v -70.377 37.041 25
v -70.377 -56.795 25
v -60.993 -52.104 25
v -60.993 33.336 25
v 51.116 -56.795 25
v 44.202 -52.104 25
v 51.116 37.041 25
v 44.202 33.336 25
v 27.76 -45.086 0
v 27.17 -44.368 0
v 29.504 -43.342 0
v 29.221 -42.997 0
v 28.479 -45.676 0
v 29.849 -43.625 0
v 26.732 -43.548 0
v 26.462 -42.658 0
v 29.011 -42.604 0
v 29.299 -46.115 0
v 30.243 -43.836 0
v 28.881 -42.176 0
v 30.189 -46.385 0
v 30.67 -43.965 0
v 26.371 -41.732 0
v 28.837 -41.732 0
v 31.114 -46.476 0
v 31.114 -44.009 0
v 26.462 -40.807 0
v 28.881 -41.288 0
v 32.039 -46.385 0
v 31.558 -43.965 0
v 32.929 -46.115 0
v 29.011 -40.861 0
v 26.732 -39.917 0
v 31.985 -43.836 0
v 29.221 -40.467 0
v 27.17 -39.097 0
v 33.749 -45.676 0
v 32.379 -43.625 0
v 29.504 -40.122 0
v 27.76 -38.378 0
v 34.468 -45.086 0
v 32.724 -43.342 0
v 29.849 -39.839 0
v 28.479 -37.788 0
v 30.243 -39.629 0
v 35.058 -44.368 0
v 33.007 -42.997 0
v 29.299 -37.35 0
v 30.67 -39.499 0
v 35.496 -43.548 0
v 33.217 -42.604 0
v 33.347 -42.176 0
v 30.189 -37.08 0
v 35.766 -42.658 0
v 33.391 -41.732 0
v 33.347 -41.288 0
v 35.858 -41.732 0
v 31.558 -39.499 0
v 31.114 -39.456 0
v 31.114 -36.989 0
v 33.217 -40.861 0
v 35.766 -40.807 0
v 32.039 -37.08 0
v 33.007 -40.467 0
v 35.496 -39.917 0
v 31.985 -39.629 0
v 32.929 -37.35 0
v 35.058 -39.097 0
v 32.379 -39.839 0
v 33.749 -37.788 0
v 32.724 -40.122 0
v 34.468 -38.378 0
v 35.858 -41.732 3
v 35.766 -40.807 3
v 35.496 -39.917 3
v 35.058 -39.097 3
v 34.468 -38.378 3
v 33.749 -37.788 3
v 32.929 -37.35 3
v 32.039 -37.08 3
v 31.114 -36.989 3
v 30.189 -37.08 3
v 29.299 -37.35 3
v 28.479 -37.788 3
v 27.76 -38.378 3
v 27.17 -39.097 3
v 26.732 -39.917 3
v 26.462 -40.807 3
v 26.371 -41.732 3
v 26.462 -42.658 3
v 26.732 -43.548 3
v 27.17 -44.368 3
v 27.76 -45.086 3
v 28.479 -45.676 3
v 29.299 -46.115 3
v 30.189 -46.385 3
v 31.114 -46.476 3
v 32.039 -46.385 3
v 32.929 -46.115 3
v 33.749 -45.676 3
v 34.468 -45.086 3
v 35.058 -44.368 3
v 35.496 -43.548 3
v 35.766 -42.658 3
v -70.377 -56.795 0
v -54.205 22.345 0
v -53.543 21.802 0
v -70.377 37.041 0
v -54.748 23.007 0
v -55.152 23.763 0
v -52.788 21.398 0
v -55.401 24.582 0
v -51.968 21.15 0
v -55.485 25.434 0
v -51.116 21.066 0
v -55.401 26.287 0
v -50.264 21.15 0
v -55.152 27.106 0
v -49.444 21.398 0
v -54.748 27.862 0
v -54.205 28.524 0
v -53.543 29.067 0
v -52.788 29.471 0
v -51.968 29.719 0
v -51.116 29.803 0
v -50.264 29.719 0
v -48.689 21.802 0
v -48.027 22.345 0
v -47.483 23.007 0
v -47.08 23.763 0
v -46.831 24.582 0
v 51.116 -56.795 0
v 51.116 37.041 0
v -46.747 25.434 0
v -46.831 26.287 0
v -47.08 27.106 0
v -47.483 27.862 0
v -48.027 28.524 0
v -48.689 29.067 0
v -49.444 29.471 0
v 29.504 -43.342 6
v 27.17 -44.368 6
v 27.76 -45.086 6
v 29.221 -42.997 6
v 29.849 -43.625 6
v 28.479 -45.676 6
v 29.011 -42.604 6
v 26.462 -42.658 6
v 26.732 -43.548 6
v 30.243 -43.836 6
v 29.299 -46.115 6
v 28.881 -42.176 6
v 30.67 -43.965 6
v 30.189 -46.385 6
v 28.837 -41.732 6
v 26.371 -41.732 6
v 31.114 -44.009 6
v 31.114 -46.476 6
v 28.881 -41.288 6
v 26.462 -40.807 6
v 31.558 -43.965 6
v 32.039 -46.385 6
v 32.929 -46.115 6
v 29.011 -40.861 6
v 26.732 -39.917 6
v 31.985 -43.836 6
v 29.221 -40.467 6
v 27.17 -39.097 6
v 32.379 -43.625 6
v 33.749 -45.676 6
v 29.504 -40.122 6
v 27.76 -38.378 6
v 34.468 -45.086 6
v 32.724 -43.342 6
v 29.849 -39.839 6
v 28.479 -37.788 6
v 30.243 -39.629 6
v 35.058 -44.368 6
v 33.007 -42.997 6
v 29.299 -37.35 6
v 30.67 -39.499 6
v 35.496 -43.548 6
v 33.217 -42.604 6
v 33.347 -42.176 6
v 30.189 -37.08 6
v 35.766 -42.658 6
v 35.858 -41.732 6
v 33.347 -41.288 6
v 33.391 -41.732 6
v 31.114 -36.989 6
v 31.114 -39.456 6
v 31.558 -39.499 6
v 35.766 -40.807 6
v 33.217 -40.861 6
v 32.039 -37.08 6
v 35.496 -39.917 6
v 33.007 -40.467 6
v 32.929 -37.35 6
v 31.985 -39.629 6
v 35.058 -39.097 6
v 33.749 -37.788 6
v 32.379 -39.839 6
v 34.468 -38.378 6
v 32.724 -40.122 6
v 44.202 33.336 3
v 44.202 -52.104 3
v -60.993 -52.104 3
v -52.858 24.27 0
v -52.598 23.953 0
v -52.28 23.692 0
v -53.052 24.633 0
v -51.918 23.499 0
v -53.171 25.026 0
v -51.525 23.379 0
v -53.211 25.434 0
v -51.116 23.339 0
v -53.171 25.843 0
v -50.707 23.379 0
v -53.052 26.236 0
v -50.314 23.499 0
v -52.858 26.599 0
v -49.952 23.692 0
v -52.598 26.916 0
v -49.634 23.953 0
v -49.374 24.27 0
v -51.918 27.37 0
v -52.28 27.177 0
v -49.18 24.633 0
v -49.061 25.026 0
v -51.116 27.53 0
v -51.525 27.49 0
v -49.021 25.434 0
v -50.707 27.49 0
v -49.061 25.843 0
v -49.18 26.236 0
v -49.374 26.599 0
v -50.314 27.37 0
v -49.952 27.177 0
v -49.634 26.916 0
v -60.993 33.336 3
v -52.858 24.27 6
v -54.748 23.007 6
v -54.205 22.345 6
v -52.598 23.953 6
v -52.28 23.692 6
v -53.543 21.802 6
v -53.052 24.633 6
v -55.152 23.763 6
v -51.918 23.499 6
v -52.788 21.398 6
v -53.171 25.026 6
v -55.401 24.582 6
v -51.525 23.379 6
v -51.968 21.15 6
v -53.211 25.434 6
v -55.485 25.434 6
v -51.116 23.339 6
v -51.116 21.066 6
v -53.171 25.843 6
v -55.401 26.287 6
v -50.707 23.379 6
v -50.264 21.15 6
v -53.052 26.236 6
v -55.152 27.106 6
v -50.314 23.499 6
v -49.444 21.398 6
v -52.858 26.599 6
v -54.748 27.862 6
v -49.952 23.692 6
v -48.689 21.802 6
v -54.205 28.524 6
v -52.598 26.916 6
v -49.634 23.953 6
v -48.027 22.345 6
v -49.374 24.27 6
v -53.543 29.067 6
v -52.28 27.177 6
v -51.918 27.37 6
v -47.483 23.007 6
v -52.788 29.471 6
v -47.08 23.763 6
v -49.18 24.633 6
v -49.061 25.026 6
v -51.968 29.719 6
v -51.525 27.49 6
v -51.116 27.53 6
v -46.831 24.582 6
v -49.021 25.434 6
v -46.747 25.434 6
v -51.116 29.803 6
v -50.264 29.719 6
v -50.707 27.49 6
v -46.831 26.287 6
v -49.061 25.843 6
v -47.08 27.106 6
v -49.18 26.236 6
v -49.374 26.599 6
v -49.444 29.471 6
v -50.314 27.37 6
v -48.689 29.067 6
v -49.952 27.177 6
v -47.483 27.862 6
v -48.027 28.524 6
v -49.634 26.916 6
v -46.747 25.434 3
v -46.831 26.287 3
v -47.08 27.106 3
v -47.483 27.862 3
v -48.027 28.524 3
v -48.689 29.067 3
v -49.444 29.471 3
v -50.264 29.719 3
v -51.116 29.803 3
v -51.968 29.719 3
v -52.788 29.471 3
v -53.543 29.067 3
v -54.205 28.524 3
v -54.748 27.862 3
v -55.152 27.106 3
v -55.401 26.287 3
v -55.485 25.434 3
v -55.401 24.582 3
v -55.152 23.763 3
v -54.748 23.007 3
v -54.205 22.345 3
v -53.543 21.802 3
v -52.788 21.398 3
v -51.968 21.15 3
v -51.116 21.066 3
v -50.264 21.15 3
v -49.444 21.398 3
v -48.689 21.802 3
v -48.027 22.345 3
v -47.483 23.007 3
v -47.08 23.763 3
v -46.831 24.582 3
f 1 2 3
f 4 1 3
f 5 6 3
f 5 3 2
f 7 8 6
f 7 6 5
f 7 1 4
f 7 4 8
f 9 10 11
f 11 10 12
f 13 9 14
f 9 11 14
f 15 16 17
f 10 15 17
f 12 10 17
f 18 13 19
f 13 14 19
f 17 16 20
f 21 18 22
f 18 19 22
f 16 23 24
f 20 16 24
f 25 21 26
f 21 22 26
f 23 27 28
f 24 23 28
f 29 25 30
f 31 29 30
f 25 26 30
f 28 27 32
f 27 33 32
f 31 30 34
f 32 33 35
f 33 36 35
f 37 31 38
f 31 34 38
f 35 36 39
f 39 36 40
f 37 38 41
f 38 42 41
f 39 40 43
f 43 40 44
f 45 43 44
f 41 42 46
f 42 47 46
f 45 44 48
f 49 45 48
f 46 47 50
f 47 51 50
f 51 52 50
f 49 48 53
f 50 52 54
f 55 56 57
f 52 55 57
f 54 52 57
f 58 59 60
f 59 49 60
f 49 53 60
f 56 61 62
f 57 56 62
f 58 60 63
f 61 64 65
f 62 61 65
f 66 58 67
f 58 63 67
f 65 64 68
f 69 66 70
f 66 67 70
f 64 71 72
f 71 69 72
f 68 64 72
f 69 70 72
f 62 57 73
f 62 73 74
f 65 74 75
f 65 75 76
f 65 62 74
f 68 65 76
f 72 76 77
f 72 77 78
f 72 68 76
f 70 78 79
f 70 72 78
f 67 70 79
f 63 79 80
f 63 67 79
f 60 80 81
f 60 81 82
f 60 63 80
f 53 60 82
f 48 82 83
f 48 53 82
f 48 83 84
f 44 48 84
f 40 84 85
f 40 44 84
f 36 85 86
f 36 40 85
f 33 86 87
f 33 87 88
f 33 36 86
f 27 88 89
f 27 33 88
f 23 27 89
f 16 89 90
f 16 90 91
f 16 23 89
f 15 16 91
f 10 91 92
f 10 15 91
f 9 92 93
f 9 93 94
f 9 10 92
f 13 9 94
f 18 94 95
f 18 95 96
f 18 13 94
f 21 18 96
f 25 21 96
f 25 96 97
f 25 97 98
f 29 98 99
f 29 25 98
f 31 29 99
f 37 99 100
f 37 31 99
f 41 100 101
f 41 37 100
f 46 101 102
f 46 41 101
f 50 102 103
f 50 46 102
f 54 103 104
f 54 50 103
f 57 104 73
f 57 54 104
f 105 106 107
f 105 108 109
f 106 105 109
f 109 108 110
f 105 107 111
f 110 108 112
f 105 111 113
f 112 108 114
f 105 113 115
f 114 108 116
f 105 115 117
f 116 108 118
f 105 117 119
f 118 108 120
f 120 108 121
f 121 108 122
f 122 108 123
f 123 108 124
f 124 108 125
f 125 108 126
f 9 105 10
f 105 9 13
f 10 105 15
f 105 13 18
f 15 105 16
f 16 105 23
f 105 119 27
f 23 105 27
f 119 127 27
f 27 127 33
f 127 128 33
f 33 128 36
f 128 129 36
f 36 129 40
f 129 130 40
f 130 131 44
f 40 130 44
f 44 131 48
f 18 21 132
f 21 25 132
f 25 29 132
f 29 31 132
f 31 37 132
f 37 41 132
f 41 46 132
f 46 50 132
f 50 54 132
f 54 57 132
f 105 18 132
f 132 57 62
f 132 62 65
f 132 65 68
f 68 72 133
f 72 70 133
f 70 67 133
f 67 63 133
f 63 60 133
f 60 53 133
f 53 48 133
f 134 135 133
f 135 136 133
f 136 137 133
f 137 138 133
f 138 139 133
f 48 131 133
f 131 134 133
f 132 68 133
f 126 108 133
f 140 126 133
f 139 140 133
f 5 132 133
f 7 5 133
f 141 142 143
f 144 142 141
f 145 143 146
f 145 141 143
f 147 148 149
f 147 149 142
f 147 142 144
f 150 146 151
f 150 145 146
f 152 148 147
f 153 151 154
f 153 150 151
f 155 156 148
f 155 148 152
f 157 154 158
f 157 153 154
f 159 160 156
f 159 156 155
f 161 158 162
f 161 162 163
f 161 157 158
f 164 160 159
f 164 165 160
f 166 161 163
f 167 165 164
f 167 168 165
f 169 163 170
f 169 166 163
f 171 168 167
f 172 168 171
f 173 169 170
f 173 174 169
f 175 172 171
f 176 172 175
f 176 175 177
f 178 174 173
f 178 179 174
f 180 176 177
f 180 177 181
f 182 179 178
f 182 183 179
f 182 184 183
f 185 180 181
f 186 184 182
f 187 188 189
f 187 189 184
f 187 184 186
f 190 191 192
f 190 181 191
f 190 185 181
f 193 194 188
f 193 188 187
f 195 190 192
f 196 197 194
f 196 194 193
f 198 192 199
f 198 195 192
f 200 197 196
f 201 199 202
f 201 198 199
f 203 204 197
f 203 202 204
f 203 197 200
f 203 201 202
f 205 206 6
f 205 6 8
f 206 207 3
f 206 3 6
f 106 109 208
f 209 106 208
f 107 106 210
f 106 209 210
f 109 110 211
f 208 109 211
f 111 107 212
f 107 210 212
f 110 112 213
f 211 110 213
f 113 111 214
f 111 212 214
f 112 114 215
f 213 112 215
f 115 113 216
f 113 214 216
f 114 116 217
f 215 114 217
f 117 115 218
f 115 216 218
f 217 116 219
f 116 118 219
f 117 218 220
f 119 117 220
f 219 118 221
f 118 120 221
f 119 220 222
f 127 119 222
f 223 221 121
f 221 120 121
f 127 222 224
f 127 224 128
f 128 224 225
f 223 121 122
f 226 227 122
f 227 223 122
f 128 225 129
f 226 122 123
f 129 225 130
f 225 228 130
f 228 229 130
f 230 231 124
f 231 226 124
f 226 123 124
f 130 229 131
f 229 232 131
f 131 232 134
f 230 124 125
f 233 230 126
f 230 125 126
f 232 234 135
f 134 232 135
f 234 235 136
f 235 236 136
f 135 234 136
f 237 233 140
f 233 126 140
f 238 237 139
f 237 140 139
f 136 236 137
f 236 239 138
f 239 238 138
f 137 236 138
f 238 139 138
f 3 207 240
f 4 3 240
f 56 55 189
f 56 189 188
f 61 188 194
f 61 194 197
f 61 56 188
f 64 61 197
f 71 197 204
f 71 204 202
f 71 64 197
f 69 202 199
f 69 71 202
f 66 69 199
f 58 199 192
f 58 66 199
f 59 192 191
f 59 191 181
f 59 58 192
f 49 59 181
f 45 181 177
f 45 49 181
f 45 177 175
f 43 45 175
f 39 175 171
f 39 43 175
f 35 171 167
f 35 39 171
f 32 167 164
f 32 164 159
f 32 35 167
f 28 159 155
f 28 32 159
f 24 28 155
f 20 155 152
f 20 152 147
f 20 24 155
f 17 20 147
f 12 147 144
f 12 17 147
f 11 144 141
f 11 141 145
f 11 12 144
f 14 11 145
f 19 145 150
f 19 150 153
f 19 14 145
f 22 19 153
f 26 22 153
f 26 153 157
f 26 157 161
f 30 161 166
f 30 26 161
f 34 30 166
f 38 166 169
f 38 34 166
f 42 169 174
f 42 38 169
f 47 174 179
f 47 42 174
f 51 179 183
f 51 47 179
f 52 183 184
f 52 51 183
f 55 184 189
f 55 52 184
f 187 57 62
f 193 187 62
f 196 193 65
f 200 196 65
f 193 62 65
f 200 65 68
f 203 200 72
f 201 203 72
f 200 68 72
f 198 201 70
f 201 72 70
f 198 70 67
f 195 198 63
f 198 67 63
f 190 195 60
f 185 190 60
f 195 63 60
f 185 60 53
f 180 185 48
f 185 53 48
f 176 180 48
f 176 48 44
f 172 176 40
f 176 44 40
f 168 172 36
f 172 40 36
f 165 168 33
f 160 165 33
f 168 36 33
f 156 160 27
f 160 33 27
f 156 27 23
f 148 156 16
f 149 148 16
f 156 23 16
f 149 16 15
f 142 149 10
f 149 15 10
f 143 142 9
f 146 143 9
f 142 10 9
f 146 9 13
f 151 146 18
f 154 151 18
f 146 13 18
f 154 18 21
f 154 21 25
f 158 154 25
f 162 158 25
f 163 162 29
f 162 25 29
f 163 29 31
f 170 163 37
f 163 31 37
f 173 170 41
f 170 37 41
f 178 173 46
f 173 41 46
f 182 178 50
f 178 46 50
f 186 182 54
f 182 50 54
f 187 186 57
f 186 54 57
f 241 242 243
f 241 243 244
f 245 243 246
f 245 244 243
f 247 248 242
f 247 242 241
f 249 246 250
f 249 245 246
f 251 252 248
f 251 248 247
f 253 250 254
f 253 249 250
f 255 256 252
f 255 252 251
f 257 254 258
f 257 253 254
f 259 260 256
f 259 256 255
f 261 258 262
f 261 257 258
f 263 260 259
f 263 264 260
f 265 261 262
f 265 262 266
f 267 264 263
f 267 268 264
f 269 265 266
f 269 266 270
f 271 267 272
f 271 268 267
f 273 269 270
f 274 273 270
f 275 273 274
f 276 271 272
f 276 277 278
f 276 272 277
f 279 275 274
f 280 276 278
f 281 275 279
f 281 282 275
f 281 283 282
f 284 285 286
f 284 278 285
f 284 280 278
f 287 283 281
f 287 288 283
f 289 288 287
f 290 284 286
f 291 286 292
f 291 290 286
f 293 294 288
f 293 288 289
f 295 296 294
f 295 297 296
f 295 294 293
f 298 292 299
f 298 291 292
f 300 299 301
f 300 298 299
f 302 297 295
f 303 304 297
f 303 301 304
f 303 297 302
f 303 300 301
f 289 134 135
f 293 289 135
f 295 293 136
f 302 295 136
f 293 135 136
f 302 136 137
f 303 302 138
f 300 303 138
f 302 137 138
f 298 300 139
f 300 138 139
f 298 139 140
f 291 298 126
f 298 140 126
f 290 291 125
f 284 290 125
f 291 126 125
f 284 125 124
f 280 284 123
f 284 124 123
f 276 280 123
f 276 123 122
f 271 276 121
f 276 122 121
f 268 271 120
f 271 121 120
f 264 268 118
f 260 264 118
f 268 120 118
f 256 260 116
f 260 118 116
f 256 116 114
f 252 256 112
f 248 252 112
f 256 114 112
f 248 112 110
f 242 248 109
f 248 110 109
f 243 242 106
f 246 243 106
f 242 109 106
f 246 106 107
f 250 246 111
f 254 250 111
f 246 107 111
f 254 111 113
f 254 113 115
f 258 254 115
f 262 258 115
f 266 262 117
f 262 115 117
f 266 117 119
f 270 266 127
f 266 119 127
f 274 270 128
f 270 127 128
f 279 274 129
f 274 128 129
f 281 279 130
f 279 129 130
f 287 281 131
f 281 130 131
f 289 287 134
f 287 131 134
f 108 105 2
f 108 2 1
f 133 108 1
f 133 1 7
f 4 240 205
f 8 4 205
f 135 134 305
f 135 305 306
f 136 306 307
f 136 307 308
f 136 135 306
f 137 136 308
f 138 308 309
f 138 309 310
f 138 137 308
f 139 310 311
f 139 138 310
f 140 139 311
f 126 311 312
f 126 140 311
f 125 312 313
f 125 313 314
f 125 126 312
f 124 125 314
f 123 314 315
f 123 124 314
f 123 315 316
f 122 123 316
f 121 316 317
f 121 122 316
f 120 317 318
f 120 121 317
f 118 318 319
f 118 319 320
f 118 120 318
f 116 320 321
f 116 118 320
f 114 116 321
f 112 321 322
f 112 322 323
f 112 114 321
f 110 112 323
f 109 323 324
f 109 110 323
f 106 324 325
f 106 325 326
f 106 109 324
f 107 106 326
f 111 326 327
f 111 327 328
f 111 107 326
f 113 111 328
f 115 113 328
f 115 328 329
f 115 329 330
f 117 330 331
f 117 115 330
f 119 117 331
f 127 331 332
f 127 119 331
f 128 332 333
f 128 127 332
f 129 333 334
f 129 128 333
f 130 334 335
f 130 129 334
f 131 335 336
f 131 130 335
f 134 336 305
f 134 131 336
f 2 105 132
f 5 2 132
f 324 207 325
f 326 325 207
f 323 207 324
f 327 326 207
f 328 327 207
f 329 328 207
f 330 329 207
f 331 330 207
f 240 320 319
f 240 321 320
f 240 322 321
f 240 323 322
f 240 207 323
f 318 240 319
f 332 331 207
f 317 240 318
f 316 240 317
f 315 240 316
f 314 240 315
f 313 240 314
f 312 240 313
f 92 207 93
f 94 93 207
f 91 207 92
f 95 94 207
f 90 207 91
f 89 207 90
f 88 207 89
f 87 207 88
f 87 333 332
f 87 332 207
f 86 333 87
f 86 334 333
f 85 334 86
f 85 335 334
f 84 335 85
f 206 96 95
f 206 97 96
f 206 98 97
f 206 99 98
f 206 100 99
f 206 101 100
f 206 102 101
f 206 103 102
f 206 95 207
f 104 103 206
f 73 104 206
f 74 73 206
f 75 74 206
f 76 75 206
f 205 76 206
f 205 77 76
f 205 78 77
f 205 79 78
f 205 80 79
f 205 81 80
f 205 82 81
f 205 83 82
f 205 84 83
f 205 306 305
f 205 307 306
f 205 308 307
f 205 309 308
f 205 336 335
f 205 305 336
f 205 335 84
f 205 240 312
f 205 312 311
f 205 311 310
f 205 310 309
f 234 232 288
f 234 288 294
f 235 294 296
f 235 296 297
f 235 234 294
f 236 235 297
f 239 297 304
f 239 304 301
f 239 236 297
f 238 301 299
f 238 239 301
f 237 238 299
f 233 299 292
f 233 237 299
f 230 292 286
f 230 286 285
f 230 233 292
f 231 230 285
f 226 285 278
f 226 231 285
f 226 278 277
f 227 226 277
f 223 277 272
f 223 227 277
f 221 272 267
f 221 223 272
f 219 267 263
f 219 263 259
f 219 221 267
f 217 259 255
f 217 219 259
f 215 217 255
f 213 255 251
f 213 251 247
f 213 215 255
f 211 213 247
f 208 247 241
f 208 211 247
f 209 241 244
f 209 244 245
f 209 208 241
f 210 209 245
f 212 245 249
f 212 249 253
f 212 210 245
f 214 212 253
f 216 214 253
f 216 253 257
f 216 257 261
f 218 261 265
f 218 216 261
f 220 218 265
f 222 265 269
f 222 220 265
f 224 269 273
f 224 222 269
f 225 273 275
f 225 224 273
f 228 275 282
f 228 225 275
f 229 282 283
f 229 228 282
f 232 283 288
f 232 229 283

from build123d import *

# Parameters (mm, degrees)
F0_R     = 4.368757
F0_R_2   = 2.095327
F0_R_3   = 4.743502
F0_R_4   = 2.276644
F1_DEPTH = 6
F0_W     = 105.195061
F0_H     = 85.440118
F2_DEPTH = 3
F0_W_2   = 121.492885
F0_H_2   = 93.835965
F3_DEPTH = 25


with BuildPart() as f1:
    # F0 (on Top) → F1 (new body)
    with BuildSketch(Plane.XY):
        with Locations((-51.115908, 25.43449)):
            Circle(F0_R)
        with Locations((-51.115908, 25.43449)):
            Circle(F0_R_2, mode=Mode.SUBTRACT)
        with Locations((31.114029, -41.732308)):
            Circle(F0_R_3)
        with Locations((31.114029, -41.732308)):
            Circle(F0_R_4, mode=Mode.SUBTRACT)
    extrude(amount=F1_DEPTH)


with BuildPart() as f2:
    # F0 (on Top) → F2 (new body)
    with BuildSketch(Plane.XY):
        with Locations((-8.395851, -9.383595)):
            Rectangle(F0_W, F0_H)
        with Locations((31.114029, -41.732308)):
            Circle(F0_R_3, mode=Mode.SUBTRACT)
        with Locations((-51.115908, 25.43449)):
            Circle(F0_R, mode=Mode.SUBTRACT)
    extrude(amount=F2_DEPTH)

    # F0 (on Top) → F3 (join)
    with BuildSketch(Plane.XY):
        with Locations((-9.630534, -9.877465)):
            Rectangle(F0_W_2, F0_H_2)
        with Locations((-8.395851, -9.383595)):
            Rectangle(F0_W, F0_H, mode=Mode.SUBTRACT)
    extrude(amount=F3_DEPTH)


solid = Compound([f1.part, f2.part])
